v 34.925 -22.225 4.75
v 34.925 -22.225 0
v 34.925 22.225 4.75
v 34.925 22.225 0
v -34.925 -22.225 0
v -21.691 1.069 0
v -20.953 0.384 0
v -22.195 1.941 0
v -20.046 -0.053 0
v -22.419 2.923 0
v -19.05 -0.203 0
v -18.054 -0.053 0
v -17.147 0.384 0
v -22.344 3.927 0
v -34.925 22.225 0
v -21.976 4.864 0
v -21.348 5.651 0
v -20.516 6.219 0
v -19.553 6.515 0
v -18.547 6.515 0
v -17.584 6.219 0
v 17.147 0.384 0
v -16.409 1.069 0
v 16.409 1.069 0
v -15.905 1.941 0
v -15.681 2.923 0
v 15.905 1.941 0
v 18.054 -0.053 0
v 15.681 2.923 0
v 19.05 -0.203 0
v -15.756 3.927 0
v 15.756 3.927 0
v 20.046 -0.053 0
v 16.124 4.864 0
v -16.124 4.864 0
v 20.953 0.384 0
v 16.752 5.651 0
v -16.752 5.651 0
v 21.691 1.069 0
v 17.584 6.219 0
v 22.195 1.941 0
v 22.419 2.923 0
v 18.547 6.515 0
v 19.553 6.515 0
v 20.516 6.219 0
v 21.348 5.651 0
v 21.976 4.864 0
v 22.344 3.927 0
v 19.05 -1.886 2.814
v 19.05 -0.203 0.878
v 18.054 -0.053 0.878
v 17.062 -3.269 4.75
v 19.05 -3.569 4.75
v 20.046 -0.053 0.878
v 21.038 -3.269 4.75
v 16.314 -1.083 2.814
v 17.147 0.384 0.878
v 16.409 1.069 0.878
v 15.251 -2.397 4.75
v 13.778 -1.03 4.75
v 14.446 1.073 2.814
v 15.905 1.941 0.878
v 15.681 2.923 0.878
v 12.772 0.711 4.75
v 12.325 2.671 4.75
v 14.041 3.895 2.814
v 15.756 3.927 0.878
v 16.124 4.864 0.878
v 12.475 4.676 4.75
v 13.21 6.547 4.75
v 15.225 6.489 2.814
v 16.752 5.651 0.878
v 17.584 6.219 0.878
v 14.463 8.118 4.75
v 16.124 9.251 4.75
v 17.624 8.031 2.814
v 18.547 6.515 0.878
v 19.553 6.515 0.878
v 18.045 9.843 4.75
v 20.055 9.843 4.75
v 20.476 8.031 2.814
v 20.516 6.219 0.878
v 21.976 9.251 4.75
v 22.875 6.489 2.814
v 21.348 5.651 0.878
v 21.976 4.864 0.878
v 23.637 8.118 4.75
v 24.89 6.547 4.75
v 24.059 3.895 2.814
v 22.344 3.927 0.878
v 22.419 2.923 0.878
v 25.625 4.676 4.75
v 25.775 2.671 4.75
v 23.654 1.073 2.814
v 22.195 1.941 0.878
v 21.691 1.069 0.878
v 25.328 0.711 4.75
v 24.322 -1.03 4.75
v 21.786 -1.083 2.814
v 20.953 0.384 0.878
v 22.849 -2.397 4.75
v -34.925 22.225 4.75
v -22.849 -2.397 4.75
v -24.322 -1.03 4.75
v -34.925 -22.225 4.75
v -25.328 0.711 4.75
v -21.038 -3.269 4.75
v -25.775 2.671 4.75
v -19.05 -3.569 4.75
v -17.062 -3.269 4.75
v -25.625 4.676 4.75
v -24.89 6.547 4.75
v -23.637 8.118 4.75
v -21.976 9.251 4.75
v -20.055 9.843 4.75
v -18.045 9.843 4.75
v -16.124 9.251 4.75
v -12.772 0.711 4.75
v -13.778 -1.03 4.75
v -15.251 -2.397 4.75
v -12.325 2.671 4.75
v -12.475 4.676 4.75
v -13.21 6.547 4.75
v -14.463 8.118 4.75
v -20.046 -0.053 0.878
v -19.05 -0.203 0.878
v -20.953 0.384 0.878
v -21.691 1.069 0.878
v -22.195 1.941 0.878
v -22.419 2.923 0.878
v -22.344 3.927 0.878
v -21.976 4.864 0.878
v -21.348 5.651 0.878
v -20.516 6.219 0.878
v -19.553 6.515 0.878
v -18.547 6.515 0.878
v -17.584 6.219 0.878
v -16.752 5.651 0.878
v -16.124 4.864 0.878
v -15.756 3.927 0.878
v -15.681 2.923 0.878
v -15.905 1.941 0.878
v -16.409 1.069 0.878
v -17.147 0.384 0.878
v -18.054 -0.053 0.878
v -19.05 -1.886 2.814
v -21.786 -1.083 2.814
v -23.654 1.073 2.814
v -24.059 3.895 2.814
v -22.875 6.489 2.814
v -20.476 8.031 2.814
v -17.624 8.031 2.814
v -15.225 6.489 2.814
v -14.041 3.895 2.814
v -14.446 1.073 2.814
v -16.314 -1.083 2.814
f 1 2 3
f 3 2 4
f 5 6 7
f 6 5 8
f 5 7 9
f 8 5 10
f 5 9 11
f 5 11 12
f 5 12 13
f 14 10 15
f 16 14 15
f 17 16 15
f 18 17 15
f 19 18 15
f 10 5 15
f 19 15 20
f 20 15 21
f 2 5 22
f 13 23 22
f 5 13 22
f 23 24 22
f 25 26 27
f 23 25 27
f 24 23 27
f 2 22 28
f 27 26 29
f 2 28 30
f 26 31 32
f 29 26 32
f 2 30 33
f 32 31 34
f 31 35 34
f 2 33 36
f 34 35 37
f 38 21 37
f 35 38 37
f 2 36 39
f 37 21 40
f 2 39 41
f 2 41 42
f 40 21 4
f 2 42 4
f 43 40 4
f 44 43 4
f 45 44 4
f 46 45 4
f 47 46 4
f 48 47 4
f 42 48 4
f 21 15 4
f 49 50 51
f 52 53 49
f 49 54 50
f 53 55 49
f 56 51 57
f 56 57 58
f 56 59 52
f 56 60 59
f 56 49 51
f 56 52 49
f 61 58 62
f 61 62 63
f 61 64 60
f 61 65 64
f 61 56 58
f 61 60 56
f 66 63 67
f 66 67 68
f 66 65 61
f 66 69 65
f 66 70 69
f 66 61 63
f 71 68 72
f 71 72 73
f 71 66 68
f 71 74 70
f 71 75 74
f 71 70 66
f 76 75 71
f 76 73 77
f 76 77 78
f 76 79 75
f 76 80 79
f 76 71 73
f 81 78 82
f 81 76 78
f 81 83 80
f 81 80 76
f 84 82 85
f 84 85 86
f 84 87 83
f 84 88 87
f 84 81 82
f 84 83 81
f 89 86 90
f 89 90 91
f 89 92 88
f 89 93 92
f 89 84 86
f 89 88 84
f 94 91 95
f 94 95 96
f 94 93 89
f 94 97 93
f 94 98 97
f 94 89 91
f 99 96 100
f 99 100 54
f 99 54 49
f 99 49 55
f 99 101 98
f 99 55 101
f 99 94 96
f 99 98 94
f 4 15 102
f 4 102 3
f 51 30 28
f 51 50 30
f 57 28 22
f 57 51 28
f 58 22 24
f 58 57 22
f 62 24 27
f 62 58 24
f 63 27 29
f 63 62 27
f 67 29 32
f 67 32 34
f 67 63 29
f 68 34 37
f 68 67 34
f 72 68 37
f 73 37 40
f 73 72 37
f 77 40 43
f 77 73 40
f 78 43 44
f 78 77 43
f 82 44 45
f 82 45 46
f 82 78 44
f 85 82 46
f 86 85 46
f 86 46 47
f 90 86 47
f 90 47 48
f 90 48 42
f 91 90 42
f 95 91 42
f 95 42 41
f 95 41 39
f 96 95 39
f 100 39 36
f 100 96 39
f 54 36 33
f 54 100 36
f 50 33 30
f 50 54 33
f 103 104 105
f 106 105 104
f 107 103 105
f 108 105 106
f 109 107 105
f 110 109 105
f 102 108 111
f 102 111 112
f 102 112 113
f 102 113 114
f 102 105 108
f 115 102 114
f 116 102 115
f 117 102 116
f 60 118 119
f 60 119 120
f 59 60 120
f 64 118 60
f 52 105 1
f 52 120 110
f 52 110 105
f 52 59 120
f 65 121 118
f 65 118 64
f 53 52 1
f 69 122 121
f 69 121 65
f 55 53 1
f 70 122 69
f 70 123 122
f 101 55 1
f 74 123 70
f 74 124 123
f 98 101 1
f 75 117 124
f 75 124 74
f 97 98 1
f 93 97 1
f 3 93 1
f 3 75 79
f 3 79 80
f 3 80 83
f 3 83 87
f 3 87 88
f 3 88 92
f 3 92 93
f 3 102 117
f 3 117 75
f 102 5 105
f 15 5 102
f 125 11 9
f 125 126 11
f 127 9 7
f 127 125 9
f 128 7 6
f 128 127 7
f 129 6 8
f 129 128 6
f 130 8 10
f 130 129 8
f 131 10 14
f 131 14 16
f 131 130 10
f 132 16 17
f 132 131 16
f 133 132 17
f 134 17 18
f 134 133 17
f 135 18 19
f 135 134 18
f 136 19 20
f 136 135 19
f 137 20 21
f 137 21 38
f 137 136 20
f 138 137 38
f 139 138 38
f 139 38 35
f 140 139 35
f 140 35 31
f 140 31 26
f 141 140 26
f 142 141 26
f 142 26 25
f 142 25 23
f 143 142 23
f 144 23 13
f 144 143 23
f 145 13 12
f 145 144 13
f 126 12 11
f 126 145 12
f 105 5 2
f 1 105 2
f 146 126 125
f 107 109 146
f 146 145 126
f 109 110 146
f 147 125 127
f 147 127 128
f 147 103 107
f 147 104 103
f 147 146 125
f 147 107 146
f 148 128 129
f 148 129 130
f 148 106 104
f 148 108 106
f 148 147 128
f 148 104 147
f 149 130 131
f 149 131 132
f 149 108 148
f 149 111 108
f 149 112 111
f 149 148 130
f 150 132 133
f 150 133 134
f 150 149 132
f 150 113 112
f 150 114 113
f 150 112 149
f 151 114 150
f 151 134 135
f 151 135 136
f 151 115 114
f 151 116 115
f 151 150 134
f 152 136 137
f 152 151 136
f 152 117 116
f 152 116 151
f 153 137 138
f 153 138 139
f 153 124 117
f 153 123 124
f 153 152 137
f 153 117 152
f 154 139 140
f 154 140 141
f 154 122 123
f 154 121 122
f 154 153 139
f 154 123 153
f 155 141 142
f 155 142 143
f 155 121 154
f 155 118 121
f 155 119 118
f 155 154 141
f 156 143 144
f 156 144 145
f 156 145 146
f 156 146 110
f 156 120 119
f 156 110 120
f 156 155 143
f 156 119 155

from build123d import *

# Parameters (mm, degrees)
SKETCH1_W                                    = 69.85
SKETCH1_H                                    = 44.45
BOSS_EXTRUDE1_DEPTH                          = 4.7498
CSK_FOR_1_4_FLAT_HEAD_SOCKET_CAP_SCR_2_COUNT = 2
CSK_FOR_1_4_FLAT_HEAD_SOCKET_CAP_SCR_2_PITCH = 38.1


with BuildPart() as part:
    # Sketch1 → Boss-Extrude1 (new body)
    with BuildSketch(Plane.XY):
        Rectangle(SKETCH1_W, SKETCH1_H)
    extrude(amount=BOSS_EXTRUDE1_DEPTH)

    # Sketch3 → CSK for 1/4 Flat Head Socket Cap Screw1 (revolve, cut)
    with BuildSketch(Plane(origin=(-19.05, 3.175, 4.7498), x_dir=(0, -1, 0), z_dir=(1, 0, 0))):
        Polygon((0, 0), (0, 4.7498), (3.3782, 4.7498), (3.3782, 3.871564875), (6.7437, 0), align=None)
    csk_for_1_4_flat_head_socket_cap_screw1 = revolve(axis=Axis((-19.05, 3.175, 11.0998), (0, 0, -1)), mode=Mode.SUBTRACT)

    # CSK for 1_4 Flat Head Socket Cap Scr 2: CSK for 1/4 Flat Head Socket Cap Screw1 ×2
    with Locations(*[(i * CSK_FOR_1_4_FLAT_HEAD_SOCKET_CAP_SCR_2_PITCH, 0, 0) for i in range(1, CSK_FOR_1_4_FLAT_HEAD_SOCKET_CAP_SCR_2_COUNT)]):
        add(csk_for_1_4_flat_head_socket_cap_screw1, mode=Mode.SUBTRACT)


solid = part.part
